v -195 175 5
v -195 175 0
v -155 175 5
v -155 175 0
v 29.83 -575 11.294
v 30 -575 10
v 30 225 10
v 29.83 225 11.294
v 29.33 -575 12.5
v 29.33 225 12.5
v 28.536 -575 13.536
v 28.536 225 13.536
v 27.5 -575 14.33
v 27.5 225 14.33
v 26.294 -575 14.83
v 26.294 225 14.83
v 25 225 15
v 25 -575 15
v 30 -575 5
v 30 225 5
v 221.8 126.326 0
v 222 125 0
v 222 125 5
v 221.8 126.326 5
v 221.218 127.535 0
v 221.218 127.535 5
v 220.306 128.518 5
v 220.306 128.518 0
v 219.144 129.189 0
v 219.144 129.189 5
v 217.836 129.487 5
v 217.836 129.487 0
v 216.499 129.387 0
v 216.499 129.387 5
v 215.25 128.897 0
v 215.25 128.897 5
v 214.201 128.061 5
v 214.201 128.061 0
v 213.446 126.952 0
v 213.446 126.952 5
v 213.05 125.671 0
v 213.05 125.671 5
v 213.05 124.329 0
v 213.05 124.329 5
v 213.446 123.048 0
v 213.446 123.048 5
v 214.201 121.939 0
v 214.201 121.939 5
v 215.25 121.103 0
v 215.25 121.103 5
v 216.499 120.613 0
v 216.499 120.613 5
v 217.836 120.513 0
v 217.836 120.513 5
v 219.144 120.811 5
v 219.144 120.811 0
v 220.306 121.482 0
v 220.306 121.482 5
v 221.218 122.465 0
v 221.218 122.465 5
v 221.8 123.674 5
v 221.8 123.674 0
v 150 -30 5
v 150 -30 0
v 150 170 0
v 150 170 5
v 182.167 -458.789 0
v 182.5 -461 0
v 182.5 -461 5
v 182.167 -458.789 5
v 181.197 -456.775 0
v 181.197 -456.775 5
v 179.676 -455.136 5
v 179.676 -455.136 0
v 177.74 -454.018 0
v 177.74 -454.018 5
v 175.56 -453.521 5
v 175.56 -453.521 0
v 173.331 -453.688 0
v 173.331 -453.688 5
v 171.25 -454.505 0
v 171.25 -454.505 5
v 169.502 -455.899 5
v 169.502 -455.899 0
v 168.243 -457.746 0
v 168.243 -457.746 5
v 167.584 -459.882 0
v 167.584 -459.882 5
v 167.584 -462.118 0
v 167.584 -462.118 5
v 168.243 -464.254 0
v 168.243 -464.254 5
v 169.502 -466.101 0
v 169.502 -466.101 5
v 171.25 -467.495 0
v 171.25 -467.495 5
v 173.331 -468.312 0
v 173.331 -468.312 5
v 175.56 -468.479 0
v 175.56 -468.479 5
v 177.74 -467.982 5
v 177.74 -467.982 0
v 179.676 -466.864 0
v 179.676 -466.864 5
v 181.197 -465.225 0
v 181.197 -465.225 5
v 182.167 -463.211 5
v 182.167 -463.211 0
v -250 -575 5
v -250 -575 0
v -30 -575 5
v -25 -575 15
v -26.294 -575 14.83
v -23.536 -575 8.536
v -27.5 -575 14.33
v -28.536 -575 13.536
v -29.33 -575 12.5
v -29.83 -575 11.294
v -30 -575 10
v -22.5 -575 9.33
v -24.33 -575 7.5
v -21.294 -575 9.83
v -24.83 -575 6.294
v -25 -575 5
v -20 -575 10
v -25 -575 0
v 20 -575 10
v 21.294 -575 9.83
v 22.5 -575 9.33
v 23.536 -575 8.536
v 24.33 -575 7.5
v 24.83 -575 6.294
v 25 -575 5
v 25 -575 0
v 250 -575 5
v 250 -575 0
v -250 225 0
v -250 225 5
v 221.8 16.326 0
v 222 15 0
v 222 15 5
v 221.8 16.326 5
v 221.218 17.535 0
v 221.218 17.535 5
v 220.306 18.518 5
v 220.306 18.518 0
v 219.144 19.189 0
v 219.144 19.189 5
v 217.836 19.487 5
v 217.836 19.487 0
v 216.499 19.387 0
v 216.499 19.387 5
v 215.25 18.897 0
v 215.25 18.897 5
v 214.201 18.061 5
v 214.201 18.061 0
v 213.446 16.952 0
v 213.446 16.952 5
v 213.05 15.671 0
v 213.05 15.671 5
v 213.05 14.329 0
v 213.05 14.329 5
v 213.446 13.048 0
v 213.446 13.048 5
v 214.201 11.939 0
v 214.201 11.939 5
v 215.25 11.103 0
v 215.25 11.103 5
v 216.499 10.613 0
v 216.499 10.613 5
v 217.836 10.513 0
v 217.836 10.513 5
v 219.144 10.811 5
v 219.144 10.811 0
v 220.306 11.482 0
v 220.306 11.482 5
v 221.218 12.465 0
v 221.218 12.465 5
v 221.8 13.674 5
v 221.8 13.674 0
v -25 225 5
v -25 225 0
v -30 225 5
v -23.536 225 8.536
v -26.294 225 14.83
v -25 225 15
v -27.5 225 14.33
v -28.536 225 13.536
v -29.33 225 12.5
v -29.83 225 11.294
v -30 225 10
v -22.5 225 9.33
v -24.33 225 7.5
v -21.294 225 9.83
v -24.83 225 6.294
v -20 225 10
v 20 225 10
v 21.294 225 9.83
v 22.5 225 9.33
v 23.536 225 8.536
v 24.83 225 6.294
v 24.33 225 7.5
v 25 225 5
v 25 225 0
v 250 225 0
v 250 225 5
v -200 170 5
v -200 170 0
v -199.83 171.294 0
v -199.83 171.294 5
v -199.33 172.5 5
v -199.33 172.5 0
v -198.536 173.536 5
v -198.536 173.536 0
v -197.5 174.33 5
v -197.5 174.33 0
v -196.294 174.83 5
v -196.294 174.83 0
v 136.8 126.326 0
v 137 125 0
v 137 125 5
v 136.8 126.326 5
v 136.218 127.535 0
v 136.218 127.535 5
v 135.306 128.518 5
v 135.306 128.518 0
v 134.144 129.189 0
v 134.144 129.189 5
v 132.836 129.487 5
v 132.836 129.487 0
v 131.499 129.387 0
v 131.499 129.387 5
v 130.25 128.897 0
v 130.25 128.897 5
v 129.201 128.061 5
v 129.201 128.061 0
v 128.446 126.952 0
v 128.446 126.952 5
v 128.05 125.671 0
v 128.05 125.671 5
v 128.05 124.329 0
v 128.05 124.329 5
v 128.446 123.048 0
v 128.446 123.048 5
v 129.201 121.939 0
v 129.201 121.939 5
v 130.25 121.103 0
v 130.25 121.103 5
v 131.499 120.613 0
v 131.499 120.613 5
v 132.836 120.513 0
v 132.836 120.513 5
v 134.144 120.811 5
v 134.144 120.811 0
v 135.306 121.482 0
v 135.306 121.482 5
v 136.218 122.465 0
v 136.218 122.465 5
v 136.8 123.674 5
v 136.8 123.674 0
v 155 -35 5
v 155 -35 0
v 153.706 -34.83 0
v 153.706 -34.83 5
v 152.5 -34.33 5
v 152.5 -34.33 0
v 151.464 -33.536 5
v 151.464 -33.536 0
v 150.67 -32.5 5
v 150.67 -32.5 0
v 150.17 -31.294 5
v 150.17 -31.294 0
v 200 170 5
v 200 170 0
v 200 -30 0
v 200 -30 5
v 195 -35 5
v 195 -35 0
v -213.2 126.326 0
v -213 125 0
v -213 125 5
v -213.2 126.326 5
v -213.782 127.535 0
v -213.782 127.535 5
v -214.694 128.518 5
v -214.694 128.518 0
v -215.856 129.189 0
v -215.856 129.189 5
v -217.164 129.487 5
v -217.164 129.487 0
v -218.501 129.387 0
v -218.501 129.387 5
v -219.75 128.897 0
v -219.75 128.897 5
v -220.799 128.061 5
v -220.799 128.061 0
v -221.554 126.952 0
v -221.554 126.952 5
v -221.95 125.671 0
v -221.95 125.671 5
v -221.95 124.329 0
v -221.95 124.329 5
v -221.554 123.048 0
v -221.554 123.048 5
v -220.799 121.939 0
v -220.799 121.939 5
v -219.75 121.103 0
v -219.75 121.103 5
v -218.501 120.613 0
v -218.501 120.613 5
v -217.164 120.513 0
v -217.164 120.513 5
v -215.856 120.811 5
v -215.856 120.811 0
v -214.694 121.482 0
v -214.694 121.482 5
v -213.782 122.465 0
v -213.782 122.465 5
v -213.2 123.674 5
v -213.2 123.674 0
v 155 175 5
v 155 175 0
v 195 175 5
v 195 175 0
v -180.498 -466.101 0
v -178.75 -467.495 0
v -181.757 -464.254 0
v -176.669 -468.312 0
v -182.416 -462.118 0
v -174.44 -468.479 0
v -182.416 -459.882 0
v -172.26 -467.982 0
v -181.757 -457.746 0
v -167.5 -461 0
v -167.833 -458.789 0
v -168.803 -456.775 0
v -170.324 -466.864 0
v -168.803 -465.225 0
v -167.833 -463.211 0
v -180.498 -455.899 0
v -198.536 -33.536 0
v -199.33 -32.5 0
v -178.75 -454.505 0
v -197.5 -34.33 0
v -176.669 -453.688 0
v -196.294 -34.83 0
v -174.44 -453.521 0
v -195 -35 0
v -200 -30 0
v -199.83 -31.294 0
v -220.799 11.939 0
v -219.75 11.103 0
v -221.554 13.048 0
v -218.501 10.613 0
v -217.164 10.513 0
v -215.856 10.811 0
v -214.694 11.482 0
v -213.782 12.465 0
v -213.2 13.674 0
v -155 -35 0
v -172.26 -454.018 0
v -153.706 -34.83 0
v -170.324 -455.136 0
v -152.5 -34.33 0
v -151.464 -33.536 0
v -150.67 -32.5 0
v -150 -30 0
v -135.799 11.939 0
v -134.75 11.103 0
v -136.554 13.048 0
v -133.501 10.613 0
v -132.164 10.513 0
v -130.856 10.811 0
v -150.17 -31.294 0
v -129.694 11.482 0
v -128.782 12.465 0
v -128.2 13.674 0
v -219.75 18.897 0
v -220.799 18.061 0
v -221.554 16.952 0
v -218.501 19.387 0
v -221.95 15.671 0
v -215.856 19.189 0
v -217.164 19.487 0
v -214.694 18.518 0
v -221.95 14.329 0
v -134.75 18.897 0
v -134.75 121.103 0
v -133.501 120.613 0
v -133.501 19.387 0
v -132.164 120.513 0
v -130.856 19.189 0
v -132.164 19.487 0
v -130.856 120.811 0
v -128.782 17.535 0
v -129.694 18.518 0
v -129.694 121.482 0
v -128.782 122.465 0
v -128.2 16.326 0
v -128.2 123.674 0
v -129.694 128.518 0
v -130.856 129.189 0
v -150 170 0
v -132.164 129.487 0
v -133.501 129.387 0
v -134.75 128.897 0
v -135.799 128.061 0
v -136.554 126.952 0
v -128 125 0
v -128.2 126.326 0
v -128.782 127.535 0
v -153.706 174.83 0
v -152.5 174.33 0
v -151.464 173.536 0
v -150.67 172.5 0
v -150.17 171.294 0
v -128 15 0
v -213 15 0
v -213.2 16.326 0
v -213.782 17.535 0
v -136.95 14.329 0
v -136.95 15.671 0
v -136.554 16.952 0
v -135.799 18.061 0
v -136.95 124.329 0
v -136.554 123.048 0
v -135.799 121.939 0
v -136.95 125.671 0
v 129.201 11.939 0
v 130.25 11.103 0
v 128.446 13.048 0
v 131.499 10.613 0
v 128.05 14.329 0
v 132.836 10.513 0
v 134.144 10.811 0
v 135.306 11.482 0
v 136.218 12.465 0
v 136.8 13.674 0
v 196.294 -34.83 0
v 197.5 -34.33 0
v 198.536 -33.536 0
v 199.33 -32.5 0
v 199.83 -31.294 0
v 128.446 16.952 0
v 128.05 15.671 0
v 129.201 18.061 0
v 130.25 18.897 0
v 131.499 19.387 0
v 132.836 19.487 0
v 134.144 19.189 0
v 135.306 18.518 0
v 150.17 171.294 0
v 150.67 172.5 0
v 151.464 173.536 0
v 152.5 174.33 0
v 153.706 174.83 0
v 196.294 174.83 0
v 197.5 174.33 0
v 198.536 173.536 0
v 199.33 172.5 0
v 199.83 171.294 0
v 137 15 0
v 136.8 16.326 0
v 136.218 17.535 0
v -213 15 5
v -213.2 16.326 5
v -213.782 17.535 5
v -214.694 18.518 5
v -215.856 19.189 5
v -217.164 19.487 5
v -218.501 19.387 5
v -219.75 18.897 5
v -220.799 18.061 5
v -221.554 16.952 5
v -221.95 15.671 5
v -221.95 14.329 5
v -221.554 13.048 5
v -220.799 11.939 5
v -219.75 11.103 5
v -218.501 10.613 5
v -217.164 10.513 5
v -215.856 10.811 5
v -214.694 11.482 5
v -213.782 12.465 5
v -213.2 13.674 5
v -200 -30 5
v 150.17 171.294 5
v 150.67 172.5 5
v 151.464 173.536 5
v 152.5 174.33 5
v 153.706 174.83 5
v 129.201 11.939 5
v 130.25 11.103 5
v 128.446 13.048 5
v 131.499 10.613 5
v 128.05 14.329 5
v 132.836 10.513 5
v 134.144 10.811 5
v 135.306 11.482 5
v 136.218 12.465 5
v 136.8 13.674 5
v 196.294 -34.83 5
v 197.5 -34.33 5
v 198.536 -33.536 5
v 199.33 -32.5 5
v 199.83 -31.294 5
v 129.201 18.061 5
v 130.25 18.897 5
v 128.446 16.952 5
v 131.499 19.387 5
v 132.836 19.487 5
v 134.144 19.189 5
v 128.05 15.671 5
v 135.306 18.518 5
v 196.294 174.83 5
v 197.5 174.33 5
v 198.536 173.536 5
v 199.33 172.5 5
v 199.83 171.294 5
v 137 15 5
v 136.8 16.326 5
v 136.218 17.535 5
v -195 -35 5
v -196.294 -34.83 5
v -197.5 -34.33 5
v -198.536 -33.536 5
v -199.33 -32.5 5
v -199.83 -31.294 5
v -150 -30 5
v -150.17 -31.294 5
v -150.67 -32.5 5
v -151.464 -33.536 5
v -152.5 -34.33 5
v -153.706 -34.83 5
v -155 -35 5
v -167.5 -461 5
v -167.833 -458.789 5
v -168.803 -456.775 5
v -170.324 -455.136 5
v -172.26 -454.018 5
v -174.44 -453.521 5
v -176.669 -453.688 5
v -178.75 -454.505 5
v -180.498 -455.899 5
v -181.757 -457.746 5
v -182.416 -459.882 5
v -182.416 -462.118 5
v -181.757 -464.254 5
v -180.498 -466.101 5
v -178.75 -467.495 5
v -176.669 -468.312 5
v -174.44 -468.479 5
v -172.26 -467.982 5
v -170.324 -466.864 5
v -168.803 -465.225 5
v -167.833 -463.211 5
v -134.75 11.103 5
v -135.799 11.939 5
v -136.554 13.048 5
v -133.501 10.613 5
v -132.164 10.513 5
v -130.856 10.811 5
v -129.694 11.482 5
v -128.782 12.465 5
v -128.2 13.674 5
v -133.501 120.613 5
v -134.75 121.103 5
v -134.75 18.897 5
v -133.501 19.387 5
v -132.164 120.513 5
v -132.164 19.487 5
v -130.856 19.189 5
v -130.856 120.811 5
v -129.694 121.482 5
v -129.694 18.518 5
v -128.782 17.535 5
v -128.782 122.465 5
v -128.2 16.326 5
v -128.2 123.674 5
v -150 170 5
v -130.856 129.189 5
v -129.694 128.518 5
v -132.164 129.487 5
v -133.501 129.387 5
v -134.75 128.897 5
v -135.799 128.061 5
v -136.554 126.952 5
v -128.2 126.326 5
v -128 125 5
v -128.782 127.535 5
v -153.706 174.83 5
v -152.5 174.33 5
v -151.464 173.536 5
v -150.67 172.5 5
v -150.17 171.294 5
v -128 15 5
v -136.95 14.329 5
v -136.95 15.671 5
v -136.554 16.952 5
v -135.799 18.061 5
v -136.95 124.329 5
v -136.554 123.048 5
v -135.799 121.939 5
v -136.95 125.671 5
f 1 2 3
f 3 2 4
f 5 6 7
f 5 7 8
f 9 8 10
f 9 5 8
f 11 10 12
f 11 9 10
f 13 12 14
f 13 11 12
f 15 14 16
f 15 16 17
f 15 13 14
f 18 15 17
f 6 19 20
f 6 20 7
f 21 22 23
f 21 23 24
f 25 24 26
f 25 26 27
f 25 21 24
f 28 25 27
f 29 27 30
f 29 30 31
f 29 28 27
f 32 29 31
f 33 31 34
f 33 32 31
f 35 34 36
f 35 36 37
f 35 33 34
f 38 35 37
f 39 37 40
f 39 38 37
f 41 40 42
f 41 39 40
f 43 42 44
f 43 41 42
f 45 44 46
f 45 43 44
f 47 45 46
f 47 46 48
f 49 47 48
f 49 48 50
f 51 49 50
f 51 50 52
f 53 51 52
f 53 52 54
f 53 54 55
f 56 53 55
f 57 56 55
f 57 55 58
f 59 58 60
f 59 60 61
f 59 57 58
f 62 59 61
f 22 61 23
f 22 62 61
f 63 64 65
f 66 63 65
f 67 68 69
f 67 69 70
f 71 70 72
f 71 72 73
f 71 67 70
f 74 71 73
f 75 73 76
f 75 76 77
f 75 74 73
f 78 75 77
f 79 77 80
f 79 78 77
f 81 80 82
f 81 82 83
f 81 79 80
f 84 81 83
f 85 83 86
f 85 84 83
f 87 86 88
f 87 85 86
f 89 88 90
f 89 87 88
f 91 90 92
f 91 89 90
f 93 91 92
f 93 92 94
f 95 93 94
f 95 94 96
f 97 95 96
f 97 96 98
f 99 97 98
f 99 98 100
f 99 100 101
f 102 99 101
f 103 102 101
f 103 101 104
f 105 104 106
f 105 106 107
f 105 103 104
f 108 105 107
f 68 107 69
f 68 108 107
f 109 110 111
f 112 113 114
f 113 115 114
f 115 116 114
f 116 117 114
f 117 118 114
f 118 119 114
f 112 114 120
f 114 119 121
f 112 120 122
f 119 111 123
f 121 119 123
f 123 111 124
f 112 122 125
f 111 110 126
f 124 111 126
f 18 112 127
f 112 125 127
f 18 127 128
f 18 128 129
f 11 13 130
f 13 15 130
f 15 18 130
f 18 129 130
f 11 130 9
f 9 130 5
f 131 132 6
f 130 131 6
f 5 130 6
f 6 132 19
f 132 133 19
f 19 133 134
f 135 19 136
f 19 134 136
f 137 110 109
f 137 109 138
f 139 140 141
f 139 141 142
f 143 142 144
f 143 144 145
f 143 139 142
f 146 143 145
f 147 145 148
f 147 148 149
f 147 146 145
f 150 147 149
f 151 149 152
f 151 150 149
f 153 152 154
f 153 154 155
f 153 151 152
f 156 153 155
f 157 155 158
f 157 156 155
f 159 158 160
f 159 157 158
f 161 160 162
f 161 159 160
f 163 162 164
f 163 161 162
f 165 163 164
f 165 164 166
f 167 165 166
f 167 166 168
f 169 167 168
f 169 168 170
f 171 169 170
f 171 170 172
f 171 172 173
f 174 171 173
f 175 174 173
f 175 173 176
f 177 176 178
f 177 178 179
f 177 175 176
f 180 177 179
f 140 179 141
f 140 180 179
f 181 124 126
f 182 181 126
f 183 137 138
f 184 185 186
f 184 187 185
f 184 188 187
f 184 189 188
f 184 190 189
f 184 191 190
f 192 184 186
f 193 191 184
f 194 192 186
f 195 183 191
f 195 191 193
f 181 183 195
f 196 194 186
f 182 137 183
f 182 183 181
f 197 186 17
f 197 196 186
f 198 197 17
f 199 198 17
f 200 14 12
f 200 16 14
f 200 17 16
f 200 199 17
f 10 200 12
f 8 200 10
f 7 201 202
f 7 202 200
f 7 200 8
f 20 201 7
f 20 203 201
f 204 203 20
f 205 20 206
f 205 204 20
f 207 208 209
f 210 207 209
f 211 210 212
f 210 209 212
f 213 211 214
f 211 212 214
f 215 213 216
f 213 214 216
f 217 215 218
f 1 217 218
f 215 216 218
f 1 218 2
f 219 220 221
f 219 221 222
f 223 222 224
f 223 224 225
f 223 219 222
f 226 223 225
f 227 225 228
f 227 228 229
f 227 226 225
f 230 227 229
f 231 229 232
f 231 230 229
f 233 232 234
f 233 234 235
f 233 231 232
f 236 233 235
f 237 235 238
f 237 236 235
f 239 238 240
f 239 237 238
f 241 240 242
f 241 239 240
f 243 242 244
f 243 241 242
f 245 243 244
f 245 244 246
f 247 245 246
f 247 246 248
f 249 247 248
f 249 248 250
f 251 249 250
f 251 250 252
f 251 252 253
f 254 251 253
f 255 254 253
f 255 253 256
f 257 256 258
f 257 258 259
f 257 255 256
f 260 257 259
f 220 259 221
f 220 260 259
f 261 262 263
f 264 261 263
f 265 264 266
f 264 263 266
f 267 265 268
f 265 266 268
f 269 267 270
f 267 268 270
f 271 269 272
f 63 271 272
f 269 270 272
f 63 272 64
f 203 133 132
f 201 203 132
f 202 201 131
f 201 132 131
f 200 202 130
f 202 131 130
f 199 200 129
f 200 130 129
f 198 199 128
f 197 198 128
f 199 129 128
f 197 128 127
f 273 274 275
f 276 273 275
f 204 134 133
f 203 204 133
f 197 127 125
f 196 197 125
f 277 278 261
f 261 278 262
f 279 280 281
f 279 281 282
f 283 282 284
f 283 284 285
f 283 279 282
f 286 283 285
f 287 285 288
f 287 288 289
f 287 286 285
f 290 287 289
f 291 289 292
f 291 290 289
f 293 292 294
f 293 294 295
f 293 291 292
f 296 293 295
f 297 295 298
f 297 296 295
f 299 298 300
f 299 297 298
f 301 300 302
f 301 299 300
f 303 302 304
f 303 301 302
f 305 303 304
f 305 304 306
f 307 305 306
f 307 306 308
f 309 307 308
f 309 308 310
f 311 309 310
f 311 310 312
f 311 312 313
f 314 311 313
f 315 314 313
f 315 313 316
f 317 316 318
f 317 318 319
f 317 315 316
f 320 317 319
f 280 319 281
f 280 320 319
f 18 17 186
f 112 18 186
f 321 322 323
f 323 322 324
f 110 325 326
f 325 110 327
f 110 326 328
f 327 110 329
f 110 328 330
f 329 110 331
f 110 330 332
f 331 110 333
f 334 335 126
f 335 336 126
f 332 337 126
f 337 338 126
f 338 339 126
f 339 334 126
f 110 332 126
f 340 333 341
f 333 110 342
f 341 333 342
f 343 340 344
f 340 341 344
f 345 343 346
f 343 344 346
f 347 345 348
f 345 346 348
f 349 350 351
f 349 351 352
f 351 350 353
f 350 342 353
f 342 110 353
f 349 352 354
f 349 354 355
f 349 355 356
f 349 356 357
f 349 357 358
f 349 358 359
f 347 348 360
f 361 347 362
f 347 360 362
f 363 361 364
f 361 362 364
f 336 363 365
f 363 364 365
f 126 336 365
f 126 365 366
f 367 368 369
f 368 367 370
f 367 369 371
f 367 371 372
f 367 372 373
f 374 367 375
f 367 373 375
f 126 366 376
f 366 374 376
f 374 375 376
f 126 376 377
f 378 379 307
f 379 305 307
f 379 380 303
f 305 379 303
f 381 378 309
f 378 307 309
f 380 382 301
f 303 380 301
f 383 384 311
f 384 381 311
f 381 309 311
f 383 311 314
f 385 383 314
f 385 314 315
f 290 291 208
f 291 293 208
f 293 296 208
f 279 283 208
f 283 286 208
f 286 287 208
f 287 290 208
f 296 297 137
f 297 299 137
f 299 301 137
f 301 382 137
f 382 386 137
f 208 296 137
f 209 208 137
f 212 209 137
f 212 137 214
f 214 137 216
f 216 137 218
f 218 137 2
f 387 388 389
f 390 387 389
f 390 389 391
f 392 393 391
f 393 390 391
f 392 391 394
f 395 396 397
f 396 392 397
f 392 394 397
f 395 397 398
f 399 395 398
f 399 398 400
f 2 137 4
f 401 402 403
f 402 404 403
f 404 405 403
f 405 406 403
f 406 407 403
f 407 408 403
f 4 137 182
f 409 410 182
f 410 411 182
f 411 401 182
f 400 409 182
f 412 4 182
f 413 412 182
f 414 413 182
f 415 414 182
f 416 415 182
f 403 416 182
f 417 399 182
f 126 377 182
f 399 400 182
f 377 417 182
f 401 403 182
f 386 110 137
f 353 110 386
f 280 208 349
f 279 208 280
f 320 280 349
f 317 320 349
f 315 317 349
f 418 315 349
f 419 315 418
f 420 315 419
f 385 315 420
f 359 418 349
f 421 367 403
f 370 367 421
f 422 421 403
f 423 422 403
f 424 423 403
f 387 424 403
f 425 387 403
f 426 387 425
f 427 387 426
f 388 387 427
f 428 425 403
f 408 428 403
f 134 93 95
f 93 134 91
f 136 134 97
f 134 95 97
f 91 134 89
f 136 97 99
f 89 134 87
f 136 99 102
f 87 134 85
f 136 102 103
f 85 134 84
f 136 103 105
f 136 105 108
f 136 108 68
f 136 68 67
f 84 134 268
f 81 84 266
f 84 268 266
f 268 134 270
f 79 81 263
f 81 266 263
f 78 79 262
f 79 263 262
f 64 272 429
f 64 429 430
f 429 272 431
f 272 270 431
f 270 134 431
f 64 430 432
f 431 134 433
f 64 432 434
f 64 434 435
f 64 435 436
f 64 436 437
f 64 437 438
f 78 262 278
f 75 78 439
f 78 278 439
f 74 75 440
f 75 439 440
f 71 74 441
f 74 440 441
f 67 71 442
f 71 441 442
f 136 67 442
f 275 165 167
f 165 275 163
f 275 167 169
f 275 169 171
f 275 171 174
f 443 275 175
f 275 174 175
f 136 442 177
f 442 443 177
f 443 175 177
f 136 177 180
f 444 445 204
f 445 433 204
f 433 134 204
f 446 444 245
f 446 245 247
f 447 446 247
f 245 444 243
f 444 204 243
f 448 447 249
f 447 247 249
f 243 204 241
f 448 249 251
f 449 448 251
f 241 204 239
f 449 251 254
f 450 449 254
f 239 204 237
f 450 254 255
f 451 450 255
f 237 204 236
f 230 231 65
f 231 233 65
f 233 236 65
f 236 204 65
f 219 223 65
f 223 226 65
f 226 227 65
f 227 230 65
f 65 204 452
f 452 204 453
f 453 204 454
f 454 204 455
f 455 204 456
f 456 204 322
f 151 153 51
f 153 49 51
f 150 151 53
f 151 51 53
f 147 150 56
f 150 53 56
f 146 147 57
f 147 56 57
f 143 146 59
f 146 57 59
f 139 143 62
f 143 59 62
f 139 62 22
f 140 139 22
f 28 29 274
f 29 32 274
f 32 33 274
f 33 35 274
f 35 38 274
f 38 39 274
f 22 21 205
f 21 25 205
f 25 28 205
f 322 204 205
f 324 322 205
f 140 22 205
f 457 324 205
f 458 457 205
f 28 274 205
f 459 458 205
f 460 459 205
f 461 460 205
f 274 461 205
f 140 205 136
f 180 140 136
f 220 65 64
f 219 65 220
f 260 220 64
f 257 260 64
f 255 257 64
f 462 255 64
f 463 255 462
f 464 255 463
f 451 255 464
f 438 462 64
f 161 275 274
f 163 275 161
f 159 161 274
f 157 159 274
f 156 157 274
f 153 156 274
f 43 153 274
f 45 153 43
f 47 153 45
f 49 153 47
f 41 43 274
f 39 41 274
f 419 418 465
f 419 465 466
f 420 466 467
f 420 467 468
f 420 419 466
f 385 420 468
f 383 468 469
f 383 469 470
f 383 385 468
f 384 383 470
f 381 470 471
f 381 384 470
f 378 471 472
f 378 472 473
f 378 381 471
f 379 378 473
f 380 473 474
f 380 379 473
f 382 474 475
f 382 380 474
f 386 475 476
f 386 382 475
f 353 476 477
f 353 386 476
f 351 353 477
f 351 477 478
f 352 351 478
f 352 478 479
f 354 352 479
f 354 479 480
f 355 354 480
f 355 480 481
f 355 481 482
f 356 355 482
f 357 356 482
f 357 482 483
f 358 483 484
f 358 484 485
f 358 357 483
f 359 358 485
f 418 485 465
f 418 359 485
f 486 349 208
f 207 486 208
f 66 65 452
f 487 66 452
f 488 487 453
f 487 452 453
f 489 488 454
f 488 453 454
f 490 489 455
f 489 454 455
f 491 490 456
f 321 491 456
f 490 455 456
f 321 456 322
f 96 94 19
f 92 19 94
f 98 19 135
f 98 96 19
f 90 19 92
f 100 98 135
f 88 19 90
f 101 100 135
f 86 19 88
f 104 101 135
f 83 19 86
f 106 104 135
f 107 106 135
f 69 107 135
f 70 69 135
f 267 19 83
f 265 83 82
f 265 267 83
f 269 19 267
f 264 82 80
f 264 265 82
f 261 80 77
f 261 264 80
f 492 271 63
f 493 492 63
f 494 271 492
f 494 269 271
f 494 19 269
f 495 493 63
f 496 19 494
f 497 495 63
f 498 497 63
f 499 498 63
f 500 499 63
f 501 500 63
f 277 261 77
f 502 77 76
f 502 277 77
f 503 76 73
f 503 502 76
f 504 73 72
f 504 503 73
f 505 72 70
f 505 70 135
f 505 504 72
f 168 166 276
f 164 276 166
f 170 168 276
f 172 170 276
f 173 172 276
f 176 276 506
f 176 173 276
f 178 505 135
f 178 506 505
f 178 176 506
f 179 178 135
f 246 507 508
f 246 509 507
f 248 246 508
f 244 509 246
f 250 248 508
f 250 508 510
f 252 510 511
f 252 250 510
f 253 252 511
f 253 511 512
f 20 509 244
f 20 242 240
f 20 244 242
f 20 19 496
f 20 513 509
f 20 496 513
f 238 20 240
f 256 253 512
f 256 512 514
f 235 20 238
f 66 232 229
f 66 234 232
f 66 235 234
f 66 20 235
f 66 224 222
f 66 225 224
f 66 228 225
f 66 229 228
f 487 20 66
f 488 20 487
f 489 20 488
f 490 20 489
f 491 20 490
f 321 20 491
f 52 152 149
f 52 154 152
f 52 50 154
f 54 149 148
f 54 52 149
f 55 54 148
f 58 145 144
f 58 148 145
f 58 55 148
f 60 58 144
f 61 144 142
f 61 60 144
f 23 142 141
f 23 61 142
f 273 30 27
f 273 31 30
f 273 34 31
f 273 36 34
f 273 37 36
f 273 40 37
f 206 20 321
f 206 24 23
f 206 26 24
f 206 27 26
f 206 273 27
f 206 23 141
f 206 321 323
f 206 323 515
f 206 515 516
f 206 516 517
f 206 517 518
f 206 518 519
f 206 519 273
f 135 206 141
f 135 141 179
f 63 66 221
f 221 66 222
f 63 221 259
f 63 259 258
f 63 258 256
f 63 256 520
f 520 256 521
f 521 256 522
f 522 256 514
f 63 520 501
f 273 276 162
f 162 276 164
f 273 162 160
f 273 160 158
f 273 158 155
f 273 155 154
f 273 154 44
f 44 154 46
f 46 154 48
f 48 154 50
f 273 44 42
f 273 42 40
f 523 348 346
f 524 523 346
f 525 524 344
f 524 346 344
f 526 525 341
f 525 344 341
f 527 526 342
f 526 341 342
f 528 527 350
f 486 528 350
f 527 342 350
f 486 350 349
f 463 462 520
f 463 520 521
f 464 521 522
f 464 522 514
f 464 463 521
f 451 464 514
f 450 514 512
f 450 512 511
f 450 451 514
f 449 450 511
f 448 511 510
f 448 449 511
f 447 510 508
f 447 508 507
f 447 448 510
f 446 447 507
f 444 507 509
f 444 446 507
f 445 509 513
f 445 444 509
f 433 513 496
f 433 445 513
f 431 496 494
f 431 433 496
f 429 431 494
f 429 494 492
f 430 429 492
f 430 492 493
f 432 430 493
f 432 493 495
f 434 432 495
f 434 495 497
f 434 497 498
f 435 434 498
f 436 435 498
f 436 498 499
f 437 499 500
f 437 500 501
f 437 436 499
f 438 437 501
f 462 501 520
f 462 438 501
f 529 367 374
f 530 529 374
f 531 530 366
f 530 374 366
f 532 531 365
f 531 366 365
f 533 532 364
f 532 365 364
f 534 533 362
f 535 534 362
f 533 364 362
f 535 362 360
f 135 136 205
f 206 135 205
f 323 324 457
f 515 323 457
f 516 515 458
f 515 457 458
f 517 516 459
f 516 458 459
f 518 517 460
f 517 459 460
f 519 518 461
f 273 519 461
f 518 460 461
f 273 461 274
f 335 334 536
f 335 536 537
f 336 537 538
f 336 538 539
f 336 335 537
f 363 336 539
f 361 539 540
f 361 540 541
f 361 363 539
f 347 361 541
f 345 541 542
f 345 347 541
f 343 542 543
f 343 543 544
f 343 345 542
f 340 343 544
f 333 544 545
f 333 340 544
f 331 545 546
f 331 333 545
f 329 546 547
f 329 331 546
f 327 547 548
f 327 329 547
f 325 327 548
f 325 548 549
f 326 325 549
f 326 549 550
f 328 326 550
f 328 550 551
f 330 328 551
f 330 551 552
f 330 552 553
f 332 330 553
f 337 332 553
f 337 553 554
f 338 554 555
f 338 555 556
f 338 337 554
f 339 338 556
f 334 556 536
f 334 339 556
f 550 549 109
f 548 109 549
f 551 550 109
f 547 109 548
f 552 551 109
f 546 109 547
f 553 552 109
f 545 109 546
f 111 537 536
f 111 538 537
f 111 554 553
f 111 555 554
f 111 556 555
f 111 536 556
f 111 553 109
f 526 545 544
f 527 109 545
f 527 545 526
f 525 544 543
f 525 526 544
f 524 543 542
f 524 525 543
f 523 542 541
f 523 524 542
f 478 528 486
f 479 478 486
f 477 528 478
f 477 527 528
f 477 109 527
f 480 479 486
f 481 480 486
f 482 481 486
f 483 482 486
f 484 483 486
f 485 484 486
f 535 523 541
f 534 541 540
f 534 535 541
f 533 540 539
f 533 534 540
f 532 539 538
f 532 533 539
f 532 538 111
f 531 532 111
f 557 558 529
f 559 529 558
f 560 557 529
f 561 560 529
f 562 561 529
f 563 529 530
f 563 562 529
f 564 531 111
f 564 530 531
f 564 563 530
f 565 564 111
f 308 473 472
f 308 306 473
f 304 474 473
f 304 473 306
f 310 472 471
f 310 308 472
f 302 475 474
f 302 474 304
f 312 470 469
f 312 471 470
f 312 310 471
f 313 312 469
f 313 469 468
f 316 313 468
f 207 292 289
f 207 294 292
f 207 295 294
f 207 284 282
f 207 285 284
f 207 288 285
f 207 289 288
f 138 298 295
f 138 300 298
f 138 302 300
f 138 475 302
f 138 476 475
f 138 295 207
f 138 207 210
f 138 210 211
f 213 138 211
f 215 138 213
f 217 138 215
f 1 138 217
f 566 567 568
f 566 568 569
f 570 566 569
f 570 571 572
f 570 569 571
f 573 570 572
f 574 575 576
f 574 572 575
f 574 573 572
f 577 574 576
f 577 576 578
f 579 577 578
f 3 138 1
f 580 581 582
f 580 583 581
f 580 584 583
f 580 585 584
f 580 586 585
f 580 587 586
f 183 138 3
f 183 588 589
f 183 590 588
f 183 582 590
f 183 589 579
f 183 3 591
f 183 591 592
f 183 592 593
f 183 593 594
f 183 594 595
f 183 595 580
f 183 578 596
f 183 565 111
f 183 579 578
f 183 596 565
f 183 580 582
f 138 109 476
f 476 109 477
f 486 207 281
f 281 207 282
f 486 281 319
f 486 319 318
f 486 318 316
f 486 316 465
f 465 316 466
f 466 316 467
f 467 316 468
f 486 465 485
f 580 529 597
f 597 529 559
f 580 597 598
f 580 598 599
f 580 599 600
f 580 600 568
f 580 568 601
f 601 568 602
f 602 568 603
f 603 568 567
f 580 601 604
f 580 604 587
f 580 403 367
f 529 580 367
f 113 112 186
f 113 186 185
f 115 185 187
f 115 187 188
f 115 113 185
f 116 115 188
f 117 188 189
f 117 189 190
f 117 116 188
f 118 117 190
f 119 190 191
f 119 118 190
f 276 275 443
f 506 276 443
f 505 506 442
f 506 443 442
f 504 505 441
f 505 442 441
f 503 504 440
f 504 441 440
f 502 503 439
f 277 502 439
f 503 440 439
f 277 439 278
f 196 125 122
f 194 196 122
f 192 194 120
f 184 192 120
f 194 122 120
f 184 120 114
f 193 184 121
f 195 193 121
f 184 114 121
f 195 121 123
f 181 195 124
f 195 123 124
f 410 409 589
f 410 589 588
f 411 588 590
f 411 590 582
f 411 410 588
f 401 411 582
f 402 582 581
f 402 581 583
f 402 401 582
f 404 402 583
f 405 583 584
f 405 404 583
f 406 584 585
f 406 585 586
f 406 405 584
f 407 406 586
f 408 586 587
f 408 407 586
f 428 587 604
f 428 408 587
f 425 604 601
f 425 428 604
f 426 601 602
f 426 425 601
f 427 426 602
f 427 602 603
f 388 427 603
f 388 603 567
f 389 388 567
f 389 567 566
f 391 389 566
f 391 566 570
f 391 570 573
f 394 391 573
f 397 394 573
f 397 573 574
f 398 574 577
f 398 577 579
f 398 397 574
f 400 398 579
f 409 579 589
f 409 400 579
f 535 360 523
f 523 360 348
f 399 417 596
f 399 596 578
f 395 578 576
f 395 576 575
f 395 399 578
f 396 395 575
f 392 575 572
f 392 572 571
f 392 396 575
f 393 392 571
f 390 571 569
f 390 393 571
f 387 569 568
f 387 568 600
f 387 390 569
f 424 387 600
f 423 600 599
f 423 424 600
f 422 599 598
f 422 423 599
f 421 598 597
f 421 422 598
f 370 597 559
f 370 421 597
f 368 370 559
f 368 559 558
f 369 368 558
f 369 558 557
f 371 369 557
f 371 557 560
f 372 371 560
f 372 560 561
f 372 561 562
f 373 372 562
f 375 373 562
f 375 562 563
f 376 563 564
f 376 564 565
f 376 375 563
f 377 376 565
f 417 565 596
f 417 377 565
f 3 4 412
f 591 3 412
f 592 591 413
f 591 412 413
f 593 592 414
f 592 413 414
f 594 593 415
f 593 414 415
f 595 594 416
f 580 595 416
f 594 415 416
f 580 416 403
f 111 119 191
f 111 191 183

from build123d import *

# Parameters (mm, degrees)
F0_W     = 500
F0_H     = 800
F0_R     = 7.5
F0_R_2   = 4.5
F1_DEPTH = 5
F3_DEPTH = 800
F5_DEPTH = 800.001


with BuildPart() as f1:
    # F0 (on Top) → F1 (new body)
    with BuildSketch(Plane.XY):
        with Locations((0, -175)):
            Rectangle(F0_W, F0_H)
        with Locations((-175, -461)):
            Circle(F0_R, mode=Mode.SUBTRACT)
        with Locations((175, -461)):
            Circle(F0_R, mode=Mode.SUBTRACT)
        with Locations((-217.5, 15)):
            Circle(F0_R_2, mode=Mode.SUBTRACT)
        with Locations((-132.5, 15)):
            Circle(F0_R_2, mode=Mode.SUBTRACT)
        with BuildLine():
            ThreePointArc((-200, 170), (-198.535534, 173.535534), (-195, 175))
            Line((-195, 175), (-155, 175))
            ThreePointArc((-155, 175), (-151.464466, 173.535534), (-150, 170))
            Line((-150, 170), (-150, -30))
            ThreePointArc((-150, -30), (-151.464466, -33.535534), (-155, -35))
            Line((-155, -35), (-195, -35))
            ThreePointArc((-195, -35), (-198.535534, -33.535534), (-200, -30))
            Line((-200, -30), (-200, 170))
        make_face(mode=Mode.SUBTRACT)
        with Locations((-217.5, 125)):
            Circle(F0_R_2, mode=Mode.SUBTRACT)
        with Locations((-132.5, 125)):
            Circle(F0_R_2, mode=Mode.SUBTRACT)
        with Locations((132.5, 15)):
            Circle(F0_R_2, mode=Mode.SUBTRACT)
        with Locations((217.5, 15)):
            Circle(F0_R_2, mode=Mode.SUBTRACT)
        with BuildLine():
            Line((195, -35), (155, -35))
            ThreePointArc((155, -35), (151.464466, -33.535534), (150, -30))
            Line((150, -30), (150, 170))
            ThreePointArc((150, 170), (151.464466, 173.535534), (155, 175))
            Line((155, 175), (195, 175))
            ThreePointArc((195, 175), (198.535534, 173.535534), (200, 170))
            Line((200, 170), (200, -30))
            ThreePointArc((200, -30), (198.535534, -33.535534), (195, -35))
        make_face(mode=Mode.SUBTRACT)
        with Locations((132.5, 125)):
            Circle(F0_R_2, mode=Mode.SUBTRACT)
        with Locations((217.5, 125)):
            Circle(F0_R_2, mode=Mode.SUBTRACT)
    extrude(amount=F1_DEPTH)

    # F2 (on face) → F3 (join, through all)
    with BuildSketch(Plane.XZ.offset(575)):
        with BuildLine():
            Line((25, 15), (0, 15))
            Line((0, 15), (-25, 15))
            ThreePointArc((-25, 15), (-28.535534, 13.535534), (-30, 10))
            Line((-30, 10), (-30, 5))
            Line((-30, 5), (30, 5))
            Line((30, 5), (30, 10))
            ThreePointArc((30, 10), (28.535534, 13.535534), (25, 15))
        make_face()
    extrude(amount=-F3_DEPTH)

    # F4 (on face) → F5 (cut, through all)
    with BuildSketch(Plane.XZ.offset(575)):
        with BuildLine():
            Line((-25, 5), (-25, 0))
            Line((-25, 0), (25, 0))
            Line((25, 0), (25, 5))
            ThreePointArc((25, 5), (23.535534, 8.535534), (20, 10))
            Line((20, 10), (-20, 10))
            ThreePointArc((-20, 10), (-23.535534, 8.535534), (-25, 5))
        make_face()
    extrude(amount=-F5_DEPTH, mode=Mode.SUBTRACT)


solid = f1.part
